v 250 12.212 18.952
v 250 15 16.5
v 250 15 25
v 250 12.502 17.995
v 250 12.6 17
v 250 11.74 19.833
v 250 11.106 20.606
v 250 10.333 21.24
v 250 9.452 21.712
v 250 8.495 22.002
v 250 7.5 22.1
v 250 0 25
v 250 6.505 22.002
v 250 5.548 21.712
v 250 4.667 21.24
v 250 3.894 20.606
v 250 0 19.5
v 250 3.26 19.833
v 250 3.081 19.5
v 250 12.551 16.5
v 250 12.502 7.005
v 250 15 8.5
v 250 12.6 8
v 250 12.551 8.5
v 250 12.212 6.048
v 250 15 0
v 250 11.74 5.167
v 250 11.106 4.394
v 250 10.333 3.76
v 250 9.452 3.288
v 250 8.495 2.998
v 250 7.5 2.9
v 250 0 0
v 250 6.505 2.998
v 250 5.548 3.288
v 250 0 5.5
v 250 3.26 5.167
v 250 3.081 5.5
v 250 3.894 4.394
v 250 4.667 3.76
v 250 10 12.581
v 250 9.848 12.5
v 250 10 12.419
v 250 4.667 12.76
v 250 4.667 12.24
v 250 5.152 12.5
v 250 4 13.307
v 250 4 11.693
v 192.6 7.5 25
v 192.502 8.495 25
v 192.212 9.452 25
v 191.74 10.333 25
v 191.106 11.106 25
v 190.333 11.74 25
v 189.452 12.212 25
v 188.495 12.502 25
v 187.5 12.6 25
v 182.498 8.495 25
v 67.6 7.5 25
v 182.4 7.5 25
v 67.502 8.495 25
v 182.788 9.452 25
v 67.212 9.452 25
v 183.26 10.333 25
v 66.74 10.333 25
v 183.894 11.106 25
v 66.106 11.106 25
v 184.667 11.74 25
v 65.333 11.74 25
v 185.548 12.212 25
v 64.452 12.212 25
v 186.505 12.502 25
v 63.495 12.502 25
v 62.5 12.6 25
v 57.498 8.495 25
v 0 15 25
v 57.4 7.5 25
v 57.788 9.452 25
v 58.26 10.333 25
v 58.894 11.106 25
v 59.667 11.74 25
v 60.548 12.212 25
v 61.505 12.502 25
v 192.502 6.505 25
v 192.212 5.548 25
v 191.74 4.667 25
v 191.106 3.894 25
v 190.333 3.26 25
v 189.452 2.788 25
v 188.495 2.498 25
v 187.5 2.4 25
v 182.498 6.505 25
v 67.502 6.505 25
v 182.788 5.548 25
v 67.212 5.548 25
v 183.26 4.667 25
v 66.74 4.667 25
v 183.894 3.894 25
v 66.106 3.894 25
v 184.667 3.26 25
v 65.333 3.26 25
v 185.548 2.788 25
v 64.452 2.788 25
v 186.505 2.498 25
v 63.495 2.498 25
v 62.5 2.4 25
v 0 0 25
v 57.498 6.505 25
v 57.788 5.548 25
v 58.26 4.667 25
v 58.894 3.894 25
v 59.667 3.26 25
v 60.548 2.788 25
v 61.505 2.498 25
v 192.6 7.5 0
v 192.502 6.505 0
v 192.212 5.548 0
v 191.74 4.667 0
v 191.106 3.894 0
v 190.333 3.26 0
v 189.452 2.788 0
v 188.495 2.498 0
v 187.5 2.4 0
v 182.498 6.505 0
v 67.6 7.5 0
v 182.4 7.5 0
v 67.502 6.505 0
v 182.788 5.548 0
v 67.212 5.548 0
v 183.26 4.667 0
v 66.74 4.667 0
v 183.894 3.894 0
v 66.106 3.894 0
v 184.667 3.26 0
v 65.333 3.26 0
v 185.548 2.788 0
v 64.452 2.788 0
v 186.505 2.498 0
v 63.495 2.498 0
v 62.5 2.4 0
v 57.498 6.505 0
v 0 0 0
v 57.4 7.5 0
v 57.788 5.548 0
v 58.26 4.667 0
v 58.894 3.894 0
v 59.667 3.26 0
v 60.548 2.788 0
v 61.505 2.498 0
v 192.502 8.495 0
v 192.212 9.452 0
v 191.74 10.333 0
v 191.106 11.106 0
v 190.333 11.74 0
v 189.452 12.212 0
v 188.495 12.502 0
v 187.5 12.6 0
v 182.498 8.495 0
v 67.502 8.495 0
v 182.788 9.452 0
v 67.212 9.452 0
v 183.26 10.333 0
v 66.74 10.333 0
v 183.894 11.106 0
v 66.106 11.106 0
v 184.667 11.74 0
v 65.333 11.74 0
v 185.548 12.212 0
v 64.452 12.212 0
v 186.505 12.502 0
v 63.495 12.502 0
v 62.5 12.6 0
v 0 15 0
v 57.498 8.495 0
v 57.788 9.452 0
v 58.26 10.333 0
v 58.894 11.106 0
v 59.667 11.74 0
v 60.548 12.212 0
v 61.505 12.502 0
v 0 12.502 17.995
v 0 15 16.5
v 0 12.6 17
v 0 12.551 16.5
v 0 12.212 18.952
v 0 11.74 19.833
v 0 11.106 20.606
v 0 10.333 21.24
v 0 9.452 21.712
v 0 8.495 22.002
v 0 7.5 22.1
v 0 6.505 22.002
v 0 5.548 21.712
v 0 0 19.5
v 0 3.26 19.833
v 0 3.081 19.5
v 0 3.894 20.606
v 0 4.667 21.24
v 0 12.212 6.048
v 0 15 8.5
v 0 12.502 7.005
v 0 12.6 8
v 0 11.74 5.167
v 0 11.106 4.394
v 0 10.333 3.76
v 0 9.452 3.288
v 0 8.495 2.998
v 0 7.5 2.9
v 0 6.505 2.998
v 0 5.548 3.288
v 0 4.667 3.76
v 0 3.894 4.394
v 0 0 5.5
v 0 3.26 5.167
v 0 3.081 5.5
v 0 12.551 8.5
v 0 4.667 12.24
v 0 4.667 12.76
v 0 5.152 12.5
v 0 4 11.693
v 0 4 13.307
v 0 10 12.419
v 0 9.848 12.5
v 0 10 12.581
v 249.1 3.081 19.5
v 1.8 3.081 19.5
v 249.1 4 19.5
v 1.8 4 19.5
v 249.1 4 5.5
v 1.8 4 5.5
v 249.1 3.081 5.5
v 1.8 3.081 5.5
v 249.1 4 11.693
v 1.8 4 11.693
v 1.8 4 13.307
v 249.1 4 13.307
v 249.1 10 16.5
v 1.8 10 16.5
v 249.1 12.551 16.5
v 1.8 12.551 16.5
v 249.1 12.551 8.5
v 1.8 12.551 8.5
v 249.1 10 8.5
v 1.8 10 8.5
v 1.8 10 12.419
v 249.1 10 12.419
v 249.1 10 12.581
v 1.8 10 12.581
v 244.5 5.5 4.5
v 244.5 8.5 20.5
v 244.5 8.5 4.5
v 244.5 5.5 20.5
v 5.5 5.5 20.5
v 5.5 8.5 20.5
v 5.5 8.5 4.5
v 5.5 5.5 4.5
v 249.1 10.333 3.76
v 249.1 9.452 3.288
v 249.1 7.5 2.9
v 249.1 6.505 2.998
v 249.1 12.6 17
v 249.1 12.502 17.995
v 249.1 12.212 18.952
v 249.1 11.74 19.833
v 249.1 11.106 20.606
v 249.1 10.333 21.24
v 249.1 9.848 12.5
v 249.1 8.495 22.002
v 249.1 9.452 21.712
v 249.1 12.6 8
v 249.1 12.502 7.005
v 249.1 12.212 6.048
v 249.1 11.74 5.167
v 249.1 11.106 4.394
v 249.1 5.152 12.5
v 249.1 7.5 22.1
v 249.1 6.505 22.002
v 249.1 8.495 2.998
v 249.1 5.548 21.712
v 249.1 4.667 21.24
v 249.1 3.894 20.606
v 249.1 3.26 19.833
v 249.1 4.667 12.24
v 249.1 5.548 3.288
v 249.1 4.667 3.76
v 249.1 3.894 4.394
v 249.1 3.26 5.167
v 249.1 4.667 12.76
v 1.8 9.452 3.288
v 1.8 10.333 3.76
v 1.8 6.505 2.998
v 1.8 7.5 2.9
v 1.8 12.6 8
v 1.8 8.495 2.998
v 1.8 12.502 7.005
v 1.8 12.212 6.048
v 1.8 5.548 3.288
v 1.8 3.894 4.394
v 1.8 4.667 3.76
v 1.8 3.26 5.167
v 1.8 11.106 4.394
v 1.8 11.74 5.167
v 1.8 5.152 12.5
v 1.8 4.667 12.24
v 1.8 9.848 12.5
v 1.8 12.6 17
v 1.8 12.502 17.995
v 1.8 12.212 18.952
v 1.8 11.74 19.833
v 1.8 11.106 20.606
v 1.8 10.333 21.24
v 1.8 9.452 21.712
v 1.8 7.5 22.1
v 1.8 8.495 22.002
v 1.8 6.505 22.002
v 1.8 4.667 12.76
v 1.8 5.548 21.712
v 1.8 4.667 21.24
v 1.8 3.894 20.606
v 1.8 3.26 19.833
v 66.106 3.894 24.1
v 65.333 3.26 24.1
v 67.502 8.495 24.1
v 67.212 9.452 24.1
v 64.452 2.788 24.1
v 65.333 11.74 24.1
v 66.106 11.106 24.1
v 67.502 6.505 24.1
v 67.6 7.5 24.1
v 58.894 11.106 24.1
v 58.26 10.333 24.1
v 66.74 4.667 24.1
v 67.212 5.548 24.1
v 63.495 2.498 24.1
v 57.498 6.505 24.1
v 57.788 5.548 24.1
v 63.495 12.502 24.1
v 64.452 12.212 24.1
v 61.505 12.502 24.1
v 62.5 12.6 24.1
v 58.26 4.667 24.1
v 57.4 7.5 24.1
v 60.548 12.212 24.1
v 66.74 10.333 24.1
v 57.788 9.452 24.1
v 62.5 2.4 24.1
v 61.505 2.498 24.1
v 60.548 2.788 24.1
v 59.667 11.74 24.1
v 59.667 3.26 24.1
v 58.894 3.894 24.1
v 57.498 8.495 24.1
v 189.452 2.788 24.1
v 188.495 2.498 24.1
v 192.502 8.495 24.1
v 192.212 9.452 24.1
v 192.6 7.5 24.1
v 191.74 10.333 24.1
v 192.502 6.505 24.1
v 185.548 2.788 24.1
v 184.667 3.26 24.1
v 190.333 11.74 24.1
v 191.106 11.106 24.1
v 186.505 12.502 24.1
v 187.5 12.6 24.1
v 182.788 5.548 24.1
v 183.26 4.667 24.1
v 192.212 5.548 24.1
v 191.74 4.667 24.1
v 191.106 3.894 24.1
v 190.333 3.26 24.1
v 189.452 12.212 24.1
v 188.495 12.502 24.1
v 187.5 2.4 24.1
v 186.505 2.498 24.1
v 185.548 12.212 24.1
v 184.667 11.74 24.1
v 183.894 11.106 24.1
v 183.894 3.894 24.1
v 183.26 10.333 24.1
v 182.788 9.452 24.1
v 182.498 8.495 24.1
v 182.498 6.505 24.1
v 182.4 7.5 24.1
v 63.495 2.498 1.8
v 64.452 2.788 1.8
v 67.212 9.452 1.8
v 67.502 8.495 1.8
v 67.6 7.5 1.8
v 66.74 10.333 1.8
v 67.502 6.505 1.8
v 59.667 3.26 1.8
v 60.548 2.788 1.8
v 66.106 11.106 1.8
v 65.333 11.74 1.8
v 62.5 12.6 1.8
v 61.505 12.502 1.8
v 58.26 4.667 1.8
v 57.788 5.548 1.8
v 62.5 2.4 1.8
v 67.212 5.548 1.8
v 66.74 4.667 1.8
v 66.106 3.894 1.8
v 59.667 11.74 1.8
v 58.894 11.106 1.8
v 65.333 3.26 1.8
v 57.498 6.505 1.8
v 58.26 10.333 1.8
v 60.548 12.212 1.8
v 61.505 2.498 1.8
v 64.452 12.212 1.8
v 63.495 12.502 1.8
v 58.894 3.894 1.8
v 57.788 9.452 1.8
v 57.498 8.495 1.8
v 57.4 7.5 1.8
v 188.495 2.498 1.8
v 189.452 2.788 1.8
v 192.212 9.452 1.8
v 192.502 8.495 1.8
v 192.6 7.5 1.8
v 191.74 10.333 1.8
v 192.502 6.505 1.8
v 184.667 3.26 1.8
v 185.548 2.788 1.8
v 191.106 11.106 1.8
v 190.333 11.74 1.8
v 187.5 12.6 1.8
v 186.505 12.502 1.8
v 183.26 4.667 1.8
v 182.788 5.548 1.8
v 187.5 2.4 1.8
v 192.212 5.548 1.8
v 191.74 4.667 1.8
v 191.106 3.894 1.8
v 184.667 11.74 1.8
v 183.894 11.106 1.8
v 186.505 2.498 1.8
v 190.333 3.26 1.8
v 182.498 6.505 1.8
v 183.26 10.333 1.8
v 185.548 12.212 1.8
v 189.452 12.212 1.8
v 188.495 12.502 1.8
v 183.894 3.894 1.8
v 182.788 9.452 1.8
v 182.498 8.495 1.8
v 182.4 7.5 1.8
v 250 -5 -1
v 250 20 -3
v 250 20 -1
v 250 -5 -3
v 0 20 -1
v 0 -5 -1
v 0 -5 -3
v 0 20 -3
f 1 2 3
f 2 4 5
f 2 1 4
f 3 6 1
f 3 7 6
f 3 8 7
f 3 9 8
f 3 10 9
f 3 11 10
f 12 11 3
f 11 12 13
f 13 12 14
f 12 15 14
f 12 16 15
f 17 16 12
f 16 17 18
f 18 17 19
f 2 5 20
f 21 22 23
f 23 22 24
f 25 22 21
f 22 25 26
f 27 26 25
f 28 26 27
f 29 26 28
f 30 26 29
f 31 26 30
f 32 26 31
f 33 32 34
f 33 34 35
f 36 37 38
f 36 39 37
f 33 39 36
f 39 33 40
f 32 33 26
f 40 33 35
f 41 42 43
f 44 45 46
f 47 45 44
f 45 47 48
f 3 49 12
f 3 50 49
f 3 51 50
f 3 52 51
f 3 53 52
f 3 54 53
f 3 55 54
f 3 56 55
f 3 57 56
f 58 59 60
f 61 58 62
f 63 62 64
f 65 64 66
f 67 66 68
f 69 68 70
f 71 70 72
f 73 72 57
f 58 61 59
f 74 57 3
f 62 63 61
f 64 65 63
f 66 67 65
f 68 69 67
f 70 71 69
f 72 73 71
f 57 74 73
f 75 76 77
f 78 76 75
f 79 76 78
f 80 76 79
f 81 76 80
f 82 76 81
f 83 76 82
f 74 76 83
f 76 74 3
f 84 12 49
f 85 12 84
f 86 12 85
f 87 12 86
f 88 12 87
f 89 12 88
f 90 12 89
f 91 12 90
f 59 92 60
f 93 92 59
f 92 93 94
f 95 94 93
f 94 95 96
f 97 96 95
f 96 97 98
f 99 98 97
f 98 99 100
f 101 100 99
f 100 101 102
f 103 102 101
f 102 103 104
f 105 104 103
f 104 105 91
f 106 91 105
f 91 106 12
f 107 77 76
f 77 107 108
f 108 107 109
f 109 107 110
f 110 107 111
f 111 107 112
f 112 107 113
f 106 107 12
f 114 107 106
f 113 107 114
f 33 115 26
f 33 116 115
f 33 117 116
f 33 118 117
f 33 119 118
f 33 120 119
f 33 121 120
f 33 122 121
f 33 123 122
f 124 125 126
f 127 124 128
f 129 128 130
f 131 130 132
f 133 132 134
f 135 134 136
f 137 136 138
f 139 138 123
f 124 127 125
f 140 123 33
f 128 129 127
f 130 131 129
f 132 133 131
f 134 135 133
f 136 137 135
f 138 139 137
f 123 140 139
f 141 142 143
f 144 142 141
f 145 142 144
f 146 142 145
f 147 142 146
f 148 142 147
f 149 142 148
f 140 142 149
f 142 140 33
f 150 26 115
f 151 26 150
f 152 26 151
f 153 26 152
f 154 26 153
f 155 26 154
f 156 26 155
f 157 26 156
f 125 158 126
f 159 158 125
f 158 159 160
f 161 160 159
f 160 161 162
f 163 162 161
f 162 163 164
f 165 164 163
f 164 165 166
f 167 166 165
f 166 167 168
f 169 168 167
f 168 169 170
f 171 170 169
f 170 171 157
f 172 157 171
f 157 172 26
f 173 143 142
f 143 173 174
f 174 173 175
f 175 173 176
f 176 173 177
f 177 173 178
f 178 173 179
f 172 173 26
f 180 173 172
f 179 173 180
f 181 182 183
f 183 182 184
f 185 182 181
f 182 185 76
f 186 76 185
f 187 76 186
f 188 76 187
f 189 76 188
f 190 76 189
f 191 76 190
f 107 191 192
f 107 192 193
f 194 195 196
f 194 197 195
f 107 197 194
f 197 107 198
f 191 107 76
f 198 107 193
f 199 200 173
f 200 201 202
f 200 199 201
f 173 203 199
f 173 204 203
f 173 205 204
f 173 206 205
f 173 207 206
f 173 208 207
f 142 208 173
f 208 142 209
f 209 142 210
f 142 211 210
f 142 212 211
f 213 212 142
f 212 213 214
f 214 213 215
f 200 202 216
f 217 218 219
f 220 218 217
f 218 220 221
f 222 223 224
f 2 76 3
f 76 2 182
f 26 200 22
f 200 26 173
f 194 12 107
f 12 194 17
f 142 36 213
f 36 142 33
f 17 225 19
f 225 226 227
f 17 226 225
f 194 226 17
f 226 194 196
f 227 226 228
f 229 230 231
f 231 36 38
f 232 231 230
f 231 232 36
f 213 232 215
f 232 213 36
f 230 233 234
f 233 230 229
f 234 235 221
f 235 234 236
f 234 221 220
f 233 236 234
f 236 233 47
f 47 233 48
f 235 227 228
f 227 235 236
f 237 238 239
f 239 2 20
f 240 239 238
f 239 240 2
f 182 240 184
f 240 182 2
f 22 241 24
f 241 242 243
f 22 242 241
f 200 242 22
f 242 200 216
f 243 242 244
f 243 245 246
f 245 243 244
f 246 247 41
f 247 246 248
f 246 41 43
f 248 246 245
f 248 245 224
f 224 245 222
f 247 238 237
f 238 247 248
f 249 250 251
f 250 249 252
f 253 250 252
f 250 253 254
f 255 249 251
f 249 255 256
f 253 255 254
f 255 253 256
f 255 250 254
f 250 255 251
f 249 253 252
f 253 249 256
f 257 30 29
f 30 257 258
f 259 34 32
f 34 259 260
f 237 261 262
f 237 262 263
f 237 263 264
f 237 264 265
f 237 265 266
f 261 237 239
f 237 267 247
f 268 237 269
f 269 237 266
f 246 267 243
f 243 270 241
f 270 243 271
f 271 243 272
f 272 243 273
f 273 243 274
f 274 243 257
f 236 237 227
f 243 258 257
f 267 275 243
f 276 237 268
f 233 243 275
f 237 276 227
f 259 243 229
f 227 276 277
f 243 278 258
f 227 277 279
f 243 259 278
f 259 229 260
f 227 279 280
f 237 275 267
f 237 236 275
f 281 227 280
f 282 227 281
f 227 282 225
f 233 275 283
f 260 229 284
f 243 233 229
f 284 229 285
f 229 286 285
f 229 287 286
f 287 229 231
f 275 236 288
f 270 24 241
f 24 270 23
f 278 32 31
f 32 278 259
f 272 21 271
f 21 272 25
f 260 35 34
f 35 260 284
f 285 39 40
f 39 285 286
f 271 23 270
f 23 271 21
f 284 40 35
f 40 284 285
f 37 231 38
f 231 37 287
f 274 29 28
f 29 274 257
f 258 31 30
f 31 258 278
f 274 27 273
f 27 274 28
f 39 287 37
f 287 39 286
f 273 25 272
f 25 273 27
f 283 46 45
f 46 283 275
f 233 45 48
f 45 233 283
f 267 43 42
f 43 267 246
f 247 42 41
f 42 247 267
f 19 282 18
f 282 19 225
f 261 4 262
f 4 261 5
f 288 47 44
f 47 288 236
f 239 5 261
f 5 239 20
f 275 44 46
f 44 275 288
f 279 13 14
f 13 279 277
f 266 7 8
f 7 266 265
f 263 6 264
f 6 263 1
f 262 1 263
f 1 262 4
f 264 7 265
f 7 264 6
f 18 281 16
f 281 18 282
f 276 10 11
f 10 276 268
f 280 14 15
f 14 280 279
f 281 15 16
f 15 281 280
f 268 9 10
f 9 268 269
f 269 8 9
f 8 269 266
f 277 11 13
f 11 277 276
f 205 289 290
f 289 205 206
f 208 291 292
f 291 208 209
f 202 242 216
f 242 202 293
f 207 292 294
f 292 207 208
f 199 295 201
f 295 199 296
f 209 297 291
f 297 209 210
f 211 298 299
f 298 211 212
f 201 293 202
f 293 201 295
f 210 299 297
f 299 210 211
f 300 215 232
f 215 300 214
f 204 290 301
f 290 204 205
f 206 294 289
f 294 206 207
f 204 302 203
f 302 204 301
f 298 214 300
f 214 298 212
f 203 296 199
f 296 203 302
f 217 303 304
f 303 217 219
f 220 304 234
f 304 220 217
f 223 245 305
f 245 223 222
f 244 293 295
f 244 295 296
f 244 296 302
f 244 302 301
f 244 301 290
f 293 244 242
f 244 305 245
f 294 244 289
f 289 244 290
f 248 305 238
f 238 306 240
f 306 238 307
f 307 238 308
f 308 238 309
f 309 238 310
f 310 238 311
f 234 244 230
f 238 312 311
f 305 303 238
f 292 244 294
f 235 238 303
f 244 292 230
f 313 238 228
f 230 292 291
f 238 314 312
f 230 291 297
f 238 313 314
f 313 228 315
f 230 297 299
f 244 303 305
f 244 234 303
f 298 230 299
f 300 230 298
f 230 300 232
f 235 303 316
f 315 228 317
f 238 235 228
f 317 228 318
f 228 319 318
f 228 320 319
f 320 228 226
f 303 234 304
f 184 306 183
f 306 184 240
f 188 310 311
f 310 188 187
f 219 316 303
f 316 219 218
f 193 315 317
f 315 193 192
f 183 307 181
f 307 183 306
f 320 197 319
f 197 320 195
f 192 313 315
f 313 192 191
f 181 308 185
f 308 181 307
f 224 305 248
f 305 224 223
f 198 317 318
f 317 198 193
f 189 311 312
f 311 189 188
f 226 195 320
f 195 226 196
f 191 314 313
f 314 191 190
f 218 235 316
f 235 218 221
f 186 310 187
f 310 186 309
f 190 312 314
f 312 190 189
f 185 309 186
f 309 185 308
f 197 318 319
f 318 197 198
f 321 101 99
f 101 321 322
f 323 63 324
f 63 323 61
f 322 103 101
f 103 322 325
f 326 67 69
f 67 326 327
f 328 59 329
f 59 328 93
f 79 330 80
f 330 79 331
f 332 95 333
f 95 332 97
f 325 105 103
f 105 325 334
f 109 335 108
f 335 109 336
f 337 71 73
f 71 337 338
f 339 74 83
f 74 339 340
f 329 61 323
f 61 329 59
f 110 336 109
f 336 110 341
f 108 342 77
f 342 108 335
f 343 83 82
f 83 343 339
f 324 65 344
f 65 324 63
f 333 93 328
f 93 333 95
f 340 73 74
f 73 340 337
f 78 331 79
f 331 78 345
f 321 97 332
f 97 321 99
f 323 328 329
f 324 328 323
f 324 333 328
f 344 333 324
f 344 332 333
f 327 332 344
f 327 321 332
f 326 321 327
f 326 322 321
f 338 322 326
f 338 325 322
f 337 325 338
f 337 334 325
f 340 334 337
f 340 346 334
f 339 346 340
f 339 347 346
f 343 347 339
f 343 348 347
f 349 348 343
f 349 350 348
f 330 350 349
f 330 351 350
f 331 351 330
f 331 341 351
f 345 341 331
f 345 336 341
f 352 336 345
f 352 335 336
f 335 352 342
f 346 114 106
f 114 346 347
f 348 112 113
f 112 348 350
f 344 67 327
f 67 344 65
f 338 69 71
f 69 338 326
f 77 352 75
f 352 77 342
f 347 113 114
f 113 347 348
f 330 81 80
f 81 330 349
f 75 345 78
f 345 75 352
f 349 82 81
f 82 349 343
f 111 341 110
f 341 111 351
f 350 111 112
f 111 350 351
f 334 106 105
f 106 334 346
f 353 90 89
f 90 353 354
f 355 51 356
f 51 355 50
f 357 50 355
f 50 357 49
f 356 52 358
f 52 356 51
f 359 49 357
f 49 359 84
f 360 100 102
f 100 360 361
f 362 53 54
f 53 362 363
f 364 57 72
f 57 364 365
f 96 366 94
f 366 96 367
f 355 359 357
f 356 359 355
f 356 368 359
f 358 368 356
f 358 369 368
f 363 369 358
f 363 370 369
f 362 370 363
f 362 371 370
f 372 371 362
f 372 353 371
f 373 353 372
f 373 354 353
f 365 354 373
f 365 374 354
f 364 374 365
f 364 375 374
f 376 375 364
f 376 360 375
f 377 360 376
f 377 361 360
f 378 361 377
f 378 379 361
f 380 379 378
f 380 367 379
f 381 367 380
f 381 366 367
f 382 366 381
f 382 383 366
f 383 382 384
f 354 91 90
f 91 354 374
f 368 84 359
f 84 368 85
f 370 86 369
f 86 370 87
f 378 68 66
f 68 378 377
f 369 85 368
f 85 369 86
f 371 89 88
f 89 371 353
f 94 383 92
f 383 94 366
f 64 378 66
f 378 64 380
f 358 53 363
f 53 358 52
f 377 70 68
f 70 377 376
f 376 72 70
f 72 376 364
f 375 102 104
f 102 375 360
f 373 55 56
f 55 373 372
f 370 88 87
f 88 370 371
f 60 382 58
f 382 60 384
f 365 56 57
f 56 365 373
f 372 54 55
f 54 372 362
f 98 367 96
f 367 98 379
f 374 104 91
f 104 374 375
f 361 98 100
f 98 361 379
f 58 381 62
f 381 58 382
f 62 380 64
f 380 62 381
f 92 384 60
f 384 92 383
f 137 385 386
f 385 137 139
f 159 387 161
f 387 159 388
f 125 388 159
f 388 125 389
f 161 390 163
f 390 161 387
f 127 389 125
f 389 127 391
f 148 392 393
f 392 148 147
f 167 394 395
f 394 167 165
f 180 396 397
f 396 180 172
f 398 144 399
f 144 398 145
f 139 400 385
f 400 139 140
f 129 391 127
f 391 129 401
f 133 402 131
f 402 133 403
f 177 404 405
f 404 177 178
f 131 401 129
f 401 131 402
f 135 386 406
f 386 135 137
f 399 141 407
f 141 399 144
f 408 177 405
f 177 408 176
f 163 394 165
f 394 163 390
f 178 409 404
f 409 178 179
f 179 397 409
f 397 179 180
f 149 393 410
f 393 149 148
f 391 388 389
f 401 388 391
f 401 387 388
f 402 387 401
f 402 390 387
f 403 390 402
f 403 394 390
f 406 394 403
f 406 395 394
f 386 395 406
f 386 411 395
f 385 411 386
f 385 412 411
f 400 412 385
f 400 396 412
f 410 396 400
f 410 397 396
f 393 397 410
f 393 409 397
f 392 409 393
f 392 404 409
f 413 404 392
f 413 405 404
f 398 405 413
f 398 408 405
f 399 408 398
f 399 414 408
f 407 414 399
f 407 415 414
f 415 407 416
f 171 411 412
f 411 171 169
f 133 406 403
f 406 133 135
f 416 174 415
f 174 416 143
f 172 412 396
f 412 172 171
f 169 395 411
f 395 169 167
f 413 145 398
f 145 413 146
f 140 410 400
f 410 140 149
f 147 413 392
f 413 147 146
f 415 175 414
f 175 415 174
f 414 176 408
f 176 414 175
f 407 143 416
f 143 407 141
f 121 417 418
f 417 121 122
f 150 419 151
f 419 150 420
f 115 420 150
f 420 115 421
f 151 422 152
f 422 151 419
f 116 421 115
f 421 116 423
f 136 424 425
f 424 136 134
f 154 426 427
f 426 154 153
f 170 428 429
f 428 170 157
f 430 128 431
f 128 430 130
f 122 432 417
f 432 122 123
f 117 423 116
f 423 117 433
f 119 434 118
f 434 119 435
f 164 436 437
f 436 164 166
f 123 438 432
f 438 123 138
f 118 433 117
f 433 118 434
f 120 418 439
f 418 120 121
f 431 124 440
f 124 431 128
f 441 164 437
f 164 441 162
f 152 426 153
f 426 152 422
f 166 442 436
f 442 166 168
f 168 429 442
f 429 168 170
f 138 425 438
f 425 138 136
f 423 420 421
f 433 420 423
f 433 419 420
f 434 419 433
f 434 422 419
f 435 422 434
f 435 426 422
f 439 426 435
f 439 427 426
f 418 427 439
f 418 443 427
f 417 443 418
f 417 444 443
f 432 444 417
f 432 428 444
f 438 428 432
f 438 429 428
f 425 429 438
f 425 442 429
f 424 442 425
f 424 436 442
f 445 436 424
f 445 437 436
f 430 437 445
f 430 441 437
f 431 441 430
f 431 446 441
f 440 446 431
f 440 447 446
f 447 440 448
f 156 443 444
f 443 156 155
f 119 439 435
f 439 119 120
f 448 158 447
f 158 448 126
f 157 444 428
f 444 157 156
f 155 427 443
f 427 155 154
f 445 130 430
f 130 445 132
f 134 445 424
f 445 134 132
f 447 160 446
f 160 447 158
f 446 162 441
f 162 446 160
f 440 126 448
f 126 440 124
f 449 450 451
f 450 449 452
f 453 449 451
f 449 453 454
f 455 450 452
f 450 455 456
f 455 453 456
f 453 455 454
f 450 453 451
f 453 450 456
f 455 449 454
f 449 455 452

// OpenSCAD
// file: single_module.scad
/*
 * Single LED Strip Module - Minimal Design
 * Compact holder for one section of WS2812B LED strip
 *
 * Features:
 * - Minimal size - just enough to hold the strip
 * - 4 magnet holes for modular connections
 * - Lightweight and movable
 */

// ========== CONFIGURATION ==========

// LED Strip dimensions
strip_segment_length = 250;  // Length of this module
strip_width = 12;            // WS2812B strip width

// Module dimensions (MINIMIZED)
module_width = strip_segment_length;
module_height = 25;          // 2.5cm vertical spacing (compact!)
module_depth = 15;           // Reduced from 20mm to 15mm
wall_thickness = 1.5;        // Reduced from 2mm to 1.5mm

// LED channel (on front)
led_channel_depth = 4;       // Shallow groove (reduced from 5mm)
led_channel_width = 14;      // Increased to 14mm for better fit

// Wire channel (on back)
wire_channel_width = 8;      // Narrow channel for wires
wire_channel_depth = 5;      // Back routing space

// Magnets (user's magnets: 10mm dia × 1.54mm thick)
magnet_dia = 10.2;           // 10mm + 0.2mm tolerance
magnet_thickness = 1.8;      // 1.54mm + tolerance (thin!)
magnet_inset = 8;            // Distance from edges (adjusted for 25mm height)

// ========== SINGLE MODULE ==========

module minimal_strip_holder() {
    difference() {
        // Main body - thin shell
        cube([module_width, module_depth, module_height]);

        // Front LED channel (OPEN ENDS - strip passes through)
        translate([-0.1, -0.1, module_height/2 - led_channel_width/2])
            cube([module_width + 0.2,  // Goes all the way through left to right
                  led_channel_depth + 0.1,
                  led_channel_width]);

        // Back wire channel (OPEN ENDS - wires pass through)
        translate([-0.1, module_depth - wire_channel_depth, module_height/2 - wire_channel_width/2])
            cube([module_width + 0.2,  // Goes all the way through left to right
                  wire_channel_depth + 0.1,
                  wire_channel_width]);

        // Center cavity (weight reduction)
        translate([wall_thickness + 4,
                  led_channel_depth + wall_thickness,
                  wall_thickness + 3])
            cube([module_width - 2*wall_thickness - 8,
                  module_depth - led_channel_depth - wire_channel_depth - 2*wall_thickness,
                  module_height - 2*wall_thickness - 6]);

        // HORIZONTAL magnets (left/right)
        // Right side
        translate([module_width - magnet_thickness/2, module_depth/2, magnet_inset])
            rotate([0, 90, 0])
            cylinder(h=magnet_thickness + 0.1, d=magnet_dia, $fn=32);
        translate([module_width - magnet_thickness/2, module_depth/2, module_height - magnet_inset])
            rotate([0, 90, 0])
            cylinder(h=magnet_thickness + 0.1, d=magnet_dia, $fn=32);

        // Left side
        translate([-0.1, module_depth/2, magnet_inset])
            rotate([0, 90, 0])
            cylinder(h=magnet_thickness + 0.1, d=magnet_dia, $fn=32);
        translate([-0.1, module_depth/2, module_height - magnet_inset])
            rotate([0, 90, 0])
            cylinder(h=magnet_thickness + 0.1, d=magnet_dia, $fn=32);

        // VERTICAL magnets (top/bottom)
        // Top
        translate([module_width/4, module_depth/2, module_height - magnet_thickness/2])
            cylinder(h=magnet_thickness + 0.1, d=magnet_dia, $fn=32);
        translate([3*module_width/4, module_depth/2, module_height - magnet_thickness/2])
            cylinder(h=magnet_thickness + 0.1, d=magnet_dia, $fn=32);

        // Bottom
        translate([module_width/4, module_depth/2, -0.1])
            cylinder(h=magnet_thickness + 0.1, d=magnet_dia, $fn=32);
        translate([3*module_width/4, module_depth/2, -0.1])
            cylinder(h=magnet_thickness + 0.1, d=magnet_dia, $fn=32);
    }
}

// LED strip visualization (optional)
module led_strip_visual() {
    color("white", 0.9)
    translate([wall_thickness, led_channel_depth - 3, module_height/2 - strip_width/2])
    rotate([90, 0, 0])
    cube([module_width - 2*wall_thickness, strip_width, 3]);

    // LEDs
    led_spacing = module_width / 36;  // 36 LEDs per module
    for (i = [0:35]) {
        color("gold", 0.8)
        translate([i * led_spacing + led_spacing/2,
                  1,
                  module_height/2])
            rotate([90, 0, 0])
            cylinder(h=2, d=4, $fn=6);
    }
}

// ========== RENDER ==========

// Show module
minimal_strip_holder();

// Show LED strip (uncomment to visualize)
// led_strip_visual();

// ========== EXPORT NOTES ==========
/*
 * DIMENSIONS:
 * - Size: 250mm (W) × 50mm (H) × 15mm (D)
 * - Weight: ~15-18g per module (at 15% infill)
 * - Wall thickness: 1.5mm
 *
 * MAGNETS:
 * - 4× 10mm × 3mm neodymium magnets per module
 * - Amazon: "neodymium magnets 10mm x 3mm N52"
 *
 * PRINTING:
 * - Layer height: 0.2mm
 * - Infill: 15%
 * - No supports needed
 * - Print time: ~1-1.5 hours per module
 *
 * CUSTOMIZATION:
 * - Adjust module_width for different lengths (e.g., 200mm, 333mm)
 * - Change module_height for different spacing (e.g., 30mm, 40mm, 60mm)
 * - Modify led_channel_width if your strip is wider/narrower
 *
 * EXPORT STL:
 * openscad -o module.stl single_module.scad
 */
// main file
use <single_module.scad>

// GOOD orientation - narrow 15mm face on bed
minimal_strip_holder();

// Build plate
translate([0, -5, -3])
    color("blue", 0.5)
    cube([250, 25, 2]);
